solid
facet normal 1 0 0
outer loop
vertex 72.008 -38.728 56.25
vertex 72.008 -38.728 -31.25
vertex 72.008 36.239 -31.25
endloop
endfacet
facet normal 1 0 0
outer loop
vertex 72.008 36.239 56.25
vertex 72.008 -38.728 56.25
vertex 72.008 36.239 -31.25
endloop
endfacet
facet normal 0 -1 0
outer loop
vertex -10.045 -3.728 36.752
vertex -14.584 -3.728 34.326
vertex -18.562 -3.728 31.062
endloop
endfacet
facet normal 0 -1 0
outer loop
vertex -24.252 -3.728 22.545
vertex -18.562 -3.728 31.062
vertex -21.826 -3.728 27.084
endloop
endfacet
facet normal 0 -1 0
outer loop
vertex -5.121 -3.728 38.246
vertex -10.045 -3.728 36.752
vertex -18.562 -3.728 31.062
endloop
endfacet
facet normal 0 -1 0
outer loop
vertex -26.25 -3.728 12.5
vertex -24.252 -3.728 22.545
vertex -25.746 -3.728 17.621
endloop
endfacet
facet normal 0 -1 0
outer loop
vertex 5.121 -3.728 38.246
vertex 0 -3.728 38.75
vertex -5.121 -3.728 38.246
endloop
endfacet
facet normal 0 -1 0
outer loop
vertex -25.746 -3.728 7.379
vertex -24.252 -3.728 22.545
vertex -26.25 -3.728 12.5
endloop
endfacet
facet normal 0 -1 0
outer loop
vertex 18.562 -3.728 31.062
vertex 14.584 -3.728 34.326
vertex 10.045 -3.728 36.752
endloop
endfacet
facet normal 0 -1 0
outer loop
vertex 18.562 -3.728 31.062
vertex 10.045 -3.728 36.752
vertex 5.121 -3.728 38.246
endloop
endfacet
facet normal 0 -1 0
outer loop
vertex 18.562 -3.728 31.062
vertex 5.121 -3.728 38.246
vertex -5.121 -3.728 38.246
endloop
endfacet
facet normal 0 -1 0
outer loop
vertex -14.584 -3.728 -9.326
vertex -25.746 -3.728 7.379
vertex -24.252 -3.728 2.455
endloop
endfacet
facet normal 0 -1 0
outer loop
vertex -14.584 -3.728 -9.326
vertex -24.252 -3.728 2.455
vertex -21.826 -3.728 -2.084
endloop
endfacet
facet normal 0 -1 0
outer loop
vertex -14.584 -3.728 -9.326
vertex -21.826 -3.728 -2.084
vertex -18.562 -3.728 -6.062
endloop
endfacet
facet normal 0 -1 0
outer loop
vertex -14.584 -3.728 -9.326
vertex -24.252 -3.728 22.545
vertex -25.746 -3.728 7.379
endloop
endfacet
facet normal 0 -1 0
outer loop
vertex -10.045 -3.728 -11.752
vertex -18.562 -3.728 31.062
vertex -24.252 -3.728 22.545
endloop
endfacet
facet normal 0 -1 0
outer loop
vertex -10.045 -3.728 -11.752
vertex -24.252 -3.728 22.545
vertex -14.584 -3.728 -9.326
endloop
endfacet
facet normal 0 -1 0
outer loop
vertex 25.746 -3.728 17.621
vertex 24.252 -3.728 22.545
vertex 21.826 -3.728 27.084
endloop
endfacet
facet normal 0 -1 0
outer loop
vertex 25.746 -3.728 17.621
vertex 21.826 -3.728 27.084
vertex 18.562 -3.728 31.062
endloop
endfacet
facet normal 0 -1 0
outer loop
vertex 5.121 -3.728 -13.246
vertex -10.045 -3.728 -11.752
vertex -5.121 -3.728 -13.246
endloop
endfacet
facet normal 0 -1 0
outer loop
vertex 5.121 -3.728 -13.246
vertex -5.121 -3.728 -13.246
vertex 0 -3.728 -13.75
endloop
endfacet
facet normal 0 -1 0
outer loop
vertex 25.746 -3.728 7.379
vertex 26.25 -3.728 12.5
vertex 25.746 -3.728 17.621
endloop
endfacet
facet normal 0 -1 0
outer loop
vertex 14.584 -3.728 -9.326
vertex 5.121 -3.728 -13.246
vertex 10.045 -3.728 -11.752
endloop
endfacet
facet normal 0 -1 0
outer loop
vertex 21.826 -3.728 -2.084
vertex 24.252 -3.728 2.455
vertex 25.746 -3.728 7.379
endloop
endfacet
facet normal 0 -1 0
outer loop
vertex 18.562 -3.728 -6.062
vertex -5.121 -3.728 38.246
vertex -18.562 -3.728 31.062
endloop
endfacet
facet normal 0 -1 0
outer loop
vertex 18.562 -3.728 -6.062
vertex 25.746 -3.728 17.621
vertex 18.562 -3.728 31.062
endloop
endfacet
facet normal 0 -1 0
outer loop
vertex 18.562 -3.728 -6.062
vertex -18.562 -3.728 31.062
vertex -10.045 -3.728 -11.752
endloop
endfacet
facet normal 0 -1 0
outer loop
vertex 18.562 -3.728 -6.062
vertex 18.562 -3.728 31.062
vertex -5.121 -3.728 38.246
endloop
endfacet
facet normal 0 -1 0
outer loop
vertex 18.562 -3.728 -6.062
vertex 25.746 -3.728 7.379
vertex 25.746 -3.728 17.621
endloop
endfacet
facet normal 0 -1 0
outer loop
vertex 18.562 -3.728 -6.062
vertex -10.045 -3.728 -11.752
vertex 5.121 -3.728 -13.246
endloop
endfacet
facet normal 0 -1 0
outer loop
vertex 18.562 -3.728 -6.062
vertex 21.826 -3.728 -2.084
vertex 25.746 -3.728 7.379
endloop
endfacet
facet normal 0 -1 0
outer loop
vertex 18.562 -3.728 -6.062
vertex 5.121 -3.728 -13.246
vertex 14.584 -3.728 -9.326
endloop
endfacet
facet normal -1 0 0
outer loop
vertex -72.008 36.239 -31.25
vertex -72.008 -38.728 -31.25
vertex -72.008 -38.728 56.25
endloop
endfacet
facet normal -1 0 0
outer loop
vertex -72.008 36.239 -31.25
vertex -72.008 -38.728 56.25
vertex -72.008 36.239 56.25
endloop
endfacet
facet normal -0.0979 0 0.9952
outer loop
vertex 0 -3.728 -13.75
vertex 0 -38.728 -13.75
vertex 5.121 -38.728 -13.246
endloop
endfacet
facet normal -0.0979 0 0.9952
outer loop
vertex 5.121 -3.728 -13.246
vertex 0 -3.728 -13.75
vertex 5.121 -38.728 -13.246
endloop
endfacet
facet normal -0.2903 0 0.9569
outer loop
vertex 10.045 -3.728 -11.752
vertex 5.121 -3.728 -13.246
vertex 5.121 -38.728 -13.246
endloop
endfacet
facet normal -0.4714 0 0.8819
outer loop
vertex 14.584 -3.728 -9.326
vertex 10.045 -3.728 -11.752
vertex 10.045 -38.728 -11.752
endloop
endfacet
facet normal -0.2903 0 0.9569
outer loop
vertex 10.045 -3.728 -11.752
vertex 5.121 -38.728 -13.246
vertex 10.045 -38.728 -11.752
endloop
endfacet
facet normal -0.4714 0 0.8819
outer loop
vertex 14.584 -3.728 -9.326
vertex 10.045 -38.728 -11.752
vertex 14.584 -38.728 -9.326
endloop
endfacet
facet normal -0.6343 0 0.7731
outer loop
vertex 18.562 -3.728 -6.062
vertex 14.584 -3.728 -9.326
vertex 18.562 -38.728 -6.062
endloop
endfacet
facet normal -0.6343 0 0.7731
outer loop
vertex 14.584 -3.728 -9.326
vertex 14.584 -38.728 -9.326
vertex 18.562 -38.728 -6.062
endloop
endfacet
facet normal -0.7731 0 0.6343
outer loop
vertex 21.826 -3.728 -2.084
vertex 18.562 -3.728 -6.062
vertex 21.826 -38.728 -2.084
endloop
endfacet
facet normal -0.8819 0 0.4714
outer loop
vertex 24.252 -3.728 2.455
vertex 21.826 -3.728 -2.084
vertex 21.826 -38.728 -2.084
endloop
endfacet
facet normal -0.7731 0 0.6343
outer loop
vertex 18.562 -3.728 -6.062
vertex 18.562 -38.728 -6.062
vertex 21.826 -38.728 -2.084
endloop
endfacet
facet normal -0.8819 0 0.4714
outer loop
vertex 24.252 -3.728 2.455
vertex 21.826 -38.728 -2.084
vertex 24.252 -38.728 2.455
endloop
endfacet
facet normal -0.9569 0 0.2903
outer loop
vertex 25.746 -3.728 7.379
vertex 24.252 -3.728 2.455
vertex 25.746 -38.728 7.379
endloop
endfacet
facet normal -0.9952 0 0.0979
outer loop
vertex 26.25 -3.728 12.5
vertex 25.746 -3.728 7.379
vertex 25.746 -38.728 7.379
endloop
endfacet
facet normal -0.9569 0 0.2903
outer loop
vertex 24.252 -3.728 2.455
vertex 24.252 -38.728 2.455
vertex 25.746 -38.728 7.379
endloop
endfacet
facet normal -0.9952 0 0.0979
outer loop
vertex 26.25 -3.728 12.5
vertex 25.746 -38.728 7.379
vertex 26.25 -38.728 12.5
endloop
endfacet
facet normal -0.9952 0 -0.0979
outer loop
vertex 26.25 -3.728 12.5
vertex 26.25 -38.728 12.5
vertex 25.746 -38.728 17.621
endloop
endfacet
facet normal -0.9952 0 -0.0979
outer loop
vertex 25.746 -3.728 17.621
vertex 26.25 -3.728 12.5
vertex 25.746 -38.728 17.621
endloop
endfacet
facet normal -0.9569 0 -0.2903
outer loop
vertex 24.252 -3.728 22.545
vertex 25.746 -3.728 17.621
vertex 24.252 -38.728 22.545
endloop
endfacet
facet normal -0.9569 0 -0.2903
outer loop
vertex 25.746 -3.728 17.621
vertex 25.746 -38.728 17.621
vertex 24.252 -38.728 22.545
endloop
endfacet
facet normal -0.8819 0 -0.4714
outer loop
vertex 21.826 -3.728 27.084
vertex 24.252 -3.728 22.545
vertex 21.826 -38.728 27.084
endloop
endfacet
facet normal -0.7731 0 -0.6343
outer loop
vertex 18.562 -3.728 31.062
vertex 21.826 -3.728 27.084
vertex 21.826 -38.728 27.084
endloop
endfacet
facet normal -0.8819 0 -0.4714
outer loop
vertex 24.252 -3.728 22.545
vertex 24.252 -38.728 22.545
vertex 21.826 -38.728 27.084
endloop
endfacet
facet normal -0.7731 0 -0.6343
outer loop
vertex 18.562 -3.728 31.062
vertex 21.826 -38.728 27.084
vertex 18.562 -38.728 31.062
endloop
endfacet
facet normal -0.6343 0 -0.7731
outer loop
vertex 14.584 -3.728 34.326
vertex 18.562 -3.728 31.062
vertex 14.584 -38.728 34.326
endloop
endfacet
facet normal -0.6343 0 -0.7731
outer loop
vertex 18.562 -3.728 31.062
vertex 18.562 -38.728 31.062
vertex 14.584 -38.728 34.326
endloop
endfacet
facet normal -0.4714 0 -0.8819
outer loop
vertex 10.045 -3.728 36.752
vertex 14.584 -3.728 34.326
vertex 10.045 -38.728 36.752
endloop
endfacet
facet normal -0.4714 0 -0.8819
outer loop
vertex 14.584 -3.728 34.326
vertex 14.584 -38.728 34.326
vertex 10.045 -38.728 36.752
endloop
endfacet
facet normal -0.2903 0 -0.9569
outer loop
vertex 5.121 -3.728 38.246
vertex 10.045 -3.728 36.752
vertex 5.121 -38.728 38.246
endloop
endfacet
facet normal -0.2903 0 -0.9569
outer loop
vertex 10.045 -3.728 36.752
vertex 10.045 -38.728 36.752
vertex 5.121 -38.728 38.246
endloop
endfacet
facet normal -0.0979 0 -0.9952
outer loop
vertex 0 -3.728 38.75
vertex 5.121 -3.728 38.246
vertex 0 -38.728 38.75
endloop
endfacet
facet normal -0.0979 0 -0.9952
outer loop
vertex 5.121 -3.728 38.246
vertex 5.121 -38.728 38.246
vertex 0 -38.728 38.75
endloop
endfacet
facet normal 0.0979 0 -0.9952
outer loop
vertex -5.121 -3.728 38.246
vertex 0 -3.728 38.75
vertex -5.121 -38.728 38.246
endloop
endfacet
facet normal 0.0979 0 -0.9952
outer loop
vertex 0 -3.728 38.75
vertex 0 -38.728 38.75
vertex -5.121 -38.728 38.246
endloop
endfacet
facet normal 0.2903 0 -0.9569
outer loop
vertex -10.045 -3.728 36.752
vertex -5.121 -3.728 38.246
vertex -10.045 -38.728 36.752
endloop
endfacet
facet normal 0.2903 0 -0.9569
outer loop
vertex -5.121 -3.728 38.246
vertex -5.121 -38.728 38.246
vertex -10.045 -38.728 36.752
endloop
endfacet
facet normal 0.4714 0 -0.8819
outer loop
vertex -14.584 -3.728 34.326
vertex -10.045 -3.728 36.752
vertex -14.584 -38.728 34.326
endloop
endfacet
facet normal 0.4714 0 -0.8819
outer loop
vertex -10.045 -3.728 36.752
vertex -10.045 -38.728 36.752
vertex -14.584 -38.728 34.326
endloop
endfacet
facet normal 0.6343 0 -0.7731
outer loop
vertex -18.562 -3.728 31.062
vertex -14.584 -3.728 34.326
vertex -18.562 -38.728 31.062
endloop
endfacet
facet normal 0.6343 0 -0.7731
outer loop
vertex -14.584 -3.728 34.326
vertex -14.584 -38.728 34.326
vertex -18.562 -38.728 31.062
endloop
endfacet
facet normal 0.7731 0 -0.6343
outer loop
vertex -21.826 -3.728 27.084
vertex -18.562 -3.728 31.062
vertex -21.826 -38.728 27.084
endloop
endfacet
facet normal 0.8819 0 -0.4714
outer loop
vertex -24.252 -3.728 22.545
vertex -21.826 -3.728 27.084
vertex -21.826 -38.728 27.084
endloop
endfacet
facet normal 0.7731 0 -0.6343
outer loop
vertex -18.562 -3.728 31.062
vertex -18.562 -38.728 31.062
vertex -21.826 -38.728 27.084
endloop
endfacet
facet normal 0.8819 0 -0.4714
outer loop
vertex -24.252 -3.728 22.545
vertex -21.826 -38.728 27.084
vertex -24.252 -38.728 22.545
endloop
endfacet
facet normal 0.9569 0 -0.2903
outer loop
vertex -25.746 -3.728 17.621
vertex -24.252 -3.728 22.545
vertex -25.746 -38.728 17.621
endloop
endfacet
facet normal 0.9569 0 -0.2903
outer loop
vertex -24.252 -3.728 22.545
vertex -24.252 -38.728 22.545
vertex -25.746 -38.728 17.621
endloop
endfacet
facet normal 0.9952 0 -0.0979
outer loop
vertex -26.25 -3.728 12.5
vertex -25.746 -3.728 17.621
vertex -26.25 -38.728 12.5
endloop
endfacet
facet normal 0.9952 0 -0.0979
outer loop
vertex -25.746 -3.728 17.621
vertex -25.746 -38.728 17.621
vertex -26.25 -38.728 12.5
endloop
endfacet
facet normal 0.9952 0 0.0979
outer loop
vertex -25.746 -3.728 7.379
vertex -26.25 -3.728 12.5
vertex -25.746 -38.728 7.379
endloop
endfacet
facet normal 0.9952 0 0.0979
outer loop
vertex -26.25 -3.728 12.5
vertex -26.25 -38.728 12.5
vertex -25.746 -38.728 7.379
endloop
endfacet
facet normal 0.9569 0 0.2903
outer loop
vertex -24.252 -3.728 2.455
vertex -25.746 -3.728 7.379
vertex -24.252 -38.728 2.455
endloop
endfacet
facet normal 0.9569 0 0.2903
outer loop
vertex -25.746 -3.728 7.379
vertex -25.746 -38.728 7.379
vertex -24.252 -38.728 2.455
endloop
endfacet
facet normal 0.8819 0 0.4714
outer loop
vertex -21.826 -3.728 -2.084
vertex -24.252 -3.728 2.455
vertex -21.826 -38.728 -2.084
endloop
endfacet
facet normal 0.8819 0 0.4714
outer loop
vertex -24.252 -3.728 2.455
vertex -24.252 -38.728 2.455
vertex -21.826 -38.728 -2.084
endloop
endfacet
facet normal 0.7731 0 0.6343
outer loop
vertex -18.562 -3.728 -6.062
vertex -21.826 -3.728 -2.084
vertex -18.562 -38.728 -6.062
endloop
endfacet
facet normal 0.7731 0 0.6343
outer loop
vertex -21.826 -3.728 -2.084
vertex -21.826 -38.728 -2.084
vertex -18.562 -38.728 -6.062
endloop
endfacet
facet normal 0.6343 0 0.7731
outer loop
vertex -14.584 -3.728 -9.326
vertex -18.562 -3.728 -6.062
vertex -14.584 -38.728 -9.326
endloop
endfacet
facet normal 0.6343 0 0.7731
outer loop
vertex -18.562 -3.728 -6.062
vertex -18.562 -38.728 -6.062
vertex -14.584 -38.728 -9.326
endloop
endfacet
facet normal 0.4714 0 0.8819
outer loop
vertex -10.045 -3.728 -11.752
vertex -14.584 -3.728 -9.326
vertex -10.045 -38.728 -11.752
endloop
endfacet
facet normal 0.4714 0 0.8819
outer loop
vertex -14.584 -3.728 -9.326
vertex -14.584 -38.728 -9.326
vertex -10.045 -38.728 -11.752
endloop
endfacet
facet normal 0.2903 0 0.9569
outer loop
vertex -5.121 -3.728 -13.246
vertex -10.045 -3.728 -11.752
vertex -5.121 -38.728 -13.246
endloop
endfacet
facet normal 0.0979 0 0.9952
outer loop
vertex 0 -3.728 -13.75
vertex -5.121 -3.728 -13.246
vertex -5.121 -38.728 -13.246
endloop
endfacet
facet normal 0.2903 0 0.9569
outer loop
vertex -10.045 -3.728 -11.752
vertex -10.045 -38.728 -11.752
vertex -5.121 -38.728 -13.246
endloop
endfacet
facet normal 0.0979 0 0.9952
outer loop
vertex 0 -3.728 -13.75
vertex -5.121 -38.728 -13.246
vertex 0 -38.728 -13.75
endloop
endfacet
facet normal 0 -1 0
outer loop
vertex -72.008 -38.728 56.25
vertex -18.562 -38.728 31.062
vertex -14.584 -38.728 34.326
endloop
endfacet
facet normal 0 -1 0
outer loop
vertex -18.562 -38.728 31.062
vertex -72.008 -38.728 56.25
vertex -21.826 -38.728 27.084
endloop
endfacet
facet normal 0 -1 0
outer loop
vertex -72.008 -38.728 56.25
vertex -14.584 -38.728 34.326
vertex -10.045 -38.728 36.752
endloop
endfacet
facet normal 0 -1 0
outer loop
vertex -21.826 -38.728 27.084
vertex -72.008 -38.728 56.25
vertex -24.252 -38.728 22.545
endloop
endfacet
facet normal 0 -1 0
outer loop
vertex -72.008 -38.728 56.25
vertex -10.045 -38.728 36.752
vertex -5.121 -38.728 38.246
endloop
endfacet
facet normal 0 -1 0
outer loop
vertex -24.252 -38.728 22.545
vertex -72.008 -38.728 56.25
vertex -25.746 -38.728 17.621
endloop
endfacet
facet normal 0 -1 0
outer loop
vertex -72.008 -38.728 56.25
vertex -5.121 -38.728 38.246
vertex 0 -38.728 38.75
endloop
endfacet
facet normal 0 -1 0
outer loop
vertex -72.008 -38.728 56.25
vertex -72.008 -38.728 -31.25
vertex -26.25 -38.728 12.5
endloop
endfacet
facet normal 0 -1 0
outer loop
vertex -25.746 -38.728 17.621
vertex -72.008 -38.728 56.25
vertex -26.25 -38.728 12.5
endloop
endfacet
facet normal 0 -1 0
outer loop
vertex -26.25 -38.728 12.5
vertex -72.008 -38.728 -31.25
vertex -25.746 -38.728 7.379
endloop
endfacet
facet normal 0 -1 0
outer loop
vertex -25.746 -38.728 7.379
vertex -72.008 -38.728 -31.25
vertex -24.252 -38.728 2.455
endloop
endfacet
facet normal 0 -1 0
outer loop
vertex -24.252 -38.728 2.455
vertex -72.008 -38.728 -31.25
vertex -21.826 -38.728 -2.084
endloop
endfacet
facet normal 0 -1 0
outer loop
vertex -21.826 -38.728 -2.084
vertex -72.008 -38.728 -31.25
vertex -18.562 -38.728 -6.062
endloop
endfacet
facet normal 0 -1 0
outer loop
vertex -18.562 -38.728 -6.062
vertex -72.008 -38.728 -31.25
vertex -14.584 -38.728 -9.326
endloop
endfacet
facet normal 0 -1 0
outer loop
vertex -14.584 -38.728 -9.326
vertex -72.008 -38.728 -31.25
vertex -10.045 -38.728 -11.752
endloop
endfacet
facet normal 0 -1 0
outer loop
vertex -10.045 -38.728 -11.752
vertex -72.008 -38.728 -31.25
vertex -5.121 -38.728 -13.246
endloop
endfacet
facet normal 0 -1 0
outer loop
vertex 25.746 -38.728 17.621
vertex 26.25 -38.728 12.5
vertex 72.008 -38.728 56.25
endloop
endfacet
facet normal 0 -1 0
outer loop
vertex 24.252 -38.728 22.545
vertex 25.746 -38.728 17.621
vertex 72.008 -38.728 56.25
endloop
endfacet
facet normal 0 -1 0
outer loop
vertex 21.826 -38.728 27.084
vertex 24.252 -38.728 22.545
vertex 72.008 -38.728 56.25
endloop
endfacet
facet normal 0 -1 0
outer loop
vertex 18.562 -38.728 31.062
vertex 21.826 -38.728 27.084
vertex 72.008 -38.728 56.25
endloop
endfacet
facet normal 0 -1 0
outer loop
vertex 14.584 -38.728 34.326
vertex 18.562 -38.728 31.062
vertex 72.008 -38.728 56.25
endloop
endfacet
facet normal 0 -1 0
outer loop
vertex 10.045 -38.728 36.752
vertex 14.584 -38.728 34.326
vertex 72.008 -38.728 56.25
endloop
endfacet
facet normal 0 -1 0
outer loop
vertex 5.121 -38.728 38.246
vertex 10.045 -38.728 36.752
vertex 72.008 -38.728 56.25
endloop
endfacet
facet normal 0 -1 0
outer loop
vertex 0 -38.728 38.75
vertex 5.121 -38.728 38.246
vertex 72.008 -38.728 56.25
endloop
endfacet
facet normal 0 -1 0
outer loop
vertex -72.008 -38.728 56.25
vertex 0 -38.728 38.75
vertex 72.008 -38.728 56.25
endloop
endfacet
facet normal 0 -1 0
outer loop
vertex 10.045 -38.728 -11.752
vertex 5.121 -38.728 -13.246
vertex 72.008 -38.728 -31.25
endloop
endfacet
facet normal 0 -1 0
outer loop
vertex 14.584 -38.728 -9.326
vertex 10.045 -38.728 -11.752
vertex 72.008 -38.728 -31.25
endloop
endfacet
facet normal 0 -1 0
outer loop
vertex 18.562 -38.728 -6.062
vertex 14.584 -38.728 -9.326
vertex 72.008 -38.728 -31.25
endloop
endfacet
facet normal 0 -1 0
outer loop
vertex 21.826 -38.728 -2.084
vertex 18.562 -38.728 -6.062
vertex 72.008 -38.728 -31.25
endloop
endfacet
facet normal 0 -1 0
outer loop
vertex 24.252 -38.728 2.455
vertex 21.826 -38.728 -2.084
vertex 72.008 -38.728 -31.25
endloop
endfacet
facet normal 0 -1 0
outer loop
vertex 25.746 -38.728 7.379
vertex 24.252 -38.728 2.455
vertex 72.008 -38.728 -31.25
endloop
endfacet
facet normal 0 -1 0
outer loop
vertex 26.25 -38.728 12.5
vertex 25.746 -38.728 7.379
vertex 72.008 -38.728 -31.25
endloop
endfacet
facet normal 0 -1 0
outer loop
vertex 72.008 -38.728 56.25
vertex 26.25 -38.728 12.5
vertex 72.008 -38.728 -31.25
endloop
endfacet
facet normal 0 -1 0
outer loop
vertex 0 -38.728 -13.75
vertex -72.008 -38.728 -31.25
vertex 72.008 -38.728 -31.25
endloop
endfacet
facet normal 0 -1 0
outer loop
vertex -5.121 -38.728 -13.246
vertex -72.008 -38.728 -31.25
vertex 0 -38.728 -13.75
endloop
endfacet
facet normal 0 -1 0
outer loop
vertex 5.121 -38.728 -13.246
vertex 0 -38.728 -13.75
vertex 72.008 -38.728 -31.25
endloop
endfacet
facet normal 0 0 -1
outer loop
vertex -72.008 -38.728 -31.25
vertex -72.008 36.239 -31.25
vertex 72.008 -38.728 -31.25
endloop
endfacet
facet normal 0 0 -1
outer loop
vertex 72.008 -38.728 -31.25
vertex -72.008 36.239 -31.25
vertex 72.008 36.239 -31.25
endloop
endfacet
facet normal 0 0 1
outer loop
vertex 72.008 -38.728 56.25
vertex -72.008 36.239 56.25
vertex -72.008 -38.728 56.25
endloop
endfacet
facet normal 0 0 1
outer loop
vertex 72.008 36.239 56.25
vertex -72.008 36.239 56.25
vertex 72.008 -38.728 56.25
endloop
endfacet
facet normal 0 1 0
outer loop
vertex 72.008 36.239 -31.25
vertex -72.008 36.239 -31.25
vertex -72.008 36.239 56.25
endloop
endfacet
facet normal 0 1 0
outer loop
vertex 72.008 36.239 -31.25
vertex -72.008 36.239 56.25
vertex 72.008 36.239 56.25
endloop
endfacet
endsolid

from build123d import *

# Parameters (mm, degrees)
SKETCH1_W           = 41.147295424
SKETCH1_H           = 21.419140084
BOSS_EXTRUDE1_DEPTH = 25
SKETCH2_R           = 7.5
CUT_EXTRUDE1_DEPTH  = 10
SCALE1_SCALE        = 3.5


with BuildPart() as part:
    # Sketch1 → Boss-Extrude1 (new body)
    with BuildSketch(Plane.XY):
        Rectangle(SKETCH1_W, SKETCH1_H)
    extrude(amount=BOSS_EXTRUDE1_DEPTH)

    # Sketch2 → Cut-Extrude1 (cut)
    with BuildSketch(Plane.XZ.offset(10.709570042)):
        with Locations(Location((0, 12.5, 0), (0, 0, 270))):
            Circle(SKETCH2_R)
    extrude(amount=-CUT_EXTRUDE1_DEPTH, mode=Mode.SUBTRACT)


with BuildPart() as part_1:
    # Scale1: scaled about (0, 0.497852103, 12.5)
    add(part.part.scale(SCALE1_SCALE).moved(Location((0, -1.244630257, -31.25))))


solid = part_1.part
